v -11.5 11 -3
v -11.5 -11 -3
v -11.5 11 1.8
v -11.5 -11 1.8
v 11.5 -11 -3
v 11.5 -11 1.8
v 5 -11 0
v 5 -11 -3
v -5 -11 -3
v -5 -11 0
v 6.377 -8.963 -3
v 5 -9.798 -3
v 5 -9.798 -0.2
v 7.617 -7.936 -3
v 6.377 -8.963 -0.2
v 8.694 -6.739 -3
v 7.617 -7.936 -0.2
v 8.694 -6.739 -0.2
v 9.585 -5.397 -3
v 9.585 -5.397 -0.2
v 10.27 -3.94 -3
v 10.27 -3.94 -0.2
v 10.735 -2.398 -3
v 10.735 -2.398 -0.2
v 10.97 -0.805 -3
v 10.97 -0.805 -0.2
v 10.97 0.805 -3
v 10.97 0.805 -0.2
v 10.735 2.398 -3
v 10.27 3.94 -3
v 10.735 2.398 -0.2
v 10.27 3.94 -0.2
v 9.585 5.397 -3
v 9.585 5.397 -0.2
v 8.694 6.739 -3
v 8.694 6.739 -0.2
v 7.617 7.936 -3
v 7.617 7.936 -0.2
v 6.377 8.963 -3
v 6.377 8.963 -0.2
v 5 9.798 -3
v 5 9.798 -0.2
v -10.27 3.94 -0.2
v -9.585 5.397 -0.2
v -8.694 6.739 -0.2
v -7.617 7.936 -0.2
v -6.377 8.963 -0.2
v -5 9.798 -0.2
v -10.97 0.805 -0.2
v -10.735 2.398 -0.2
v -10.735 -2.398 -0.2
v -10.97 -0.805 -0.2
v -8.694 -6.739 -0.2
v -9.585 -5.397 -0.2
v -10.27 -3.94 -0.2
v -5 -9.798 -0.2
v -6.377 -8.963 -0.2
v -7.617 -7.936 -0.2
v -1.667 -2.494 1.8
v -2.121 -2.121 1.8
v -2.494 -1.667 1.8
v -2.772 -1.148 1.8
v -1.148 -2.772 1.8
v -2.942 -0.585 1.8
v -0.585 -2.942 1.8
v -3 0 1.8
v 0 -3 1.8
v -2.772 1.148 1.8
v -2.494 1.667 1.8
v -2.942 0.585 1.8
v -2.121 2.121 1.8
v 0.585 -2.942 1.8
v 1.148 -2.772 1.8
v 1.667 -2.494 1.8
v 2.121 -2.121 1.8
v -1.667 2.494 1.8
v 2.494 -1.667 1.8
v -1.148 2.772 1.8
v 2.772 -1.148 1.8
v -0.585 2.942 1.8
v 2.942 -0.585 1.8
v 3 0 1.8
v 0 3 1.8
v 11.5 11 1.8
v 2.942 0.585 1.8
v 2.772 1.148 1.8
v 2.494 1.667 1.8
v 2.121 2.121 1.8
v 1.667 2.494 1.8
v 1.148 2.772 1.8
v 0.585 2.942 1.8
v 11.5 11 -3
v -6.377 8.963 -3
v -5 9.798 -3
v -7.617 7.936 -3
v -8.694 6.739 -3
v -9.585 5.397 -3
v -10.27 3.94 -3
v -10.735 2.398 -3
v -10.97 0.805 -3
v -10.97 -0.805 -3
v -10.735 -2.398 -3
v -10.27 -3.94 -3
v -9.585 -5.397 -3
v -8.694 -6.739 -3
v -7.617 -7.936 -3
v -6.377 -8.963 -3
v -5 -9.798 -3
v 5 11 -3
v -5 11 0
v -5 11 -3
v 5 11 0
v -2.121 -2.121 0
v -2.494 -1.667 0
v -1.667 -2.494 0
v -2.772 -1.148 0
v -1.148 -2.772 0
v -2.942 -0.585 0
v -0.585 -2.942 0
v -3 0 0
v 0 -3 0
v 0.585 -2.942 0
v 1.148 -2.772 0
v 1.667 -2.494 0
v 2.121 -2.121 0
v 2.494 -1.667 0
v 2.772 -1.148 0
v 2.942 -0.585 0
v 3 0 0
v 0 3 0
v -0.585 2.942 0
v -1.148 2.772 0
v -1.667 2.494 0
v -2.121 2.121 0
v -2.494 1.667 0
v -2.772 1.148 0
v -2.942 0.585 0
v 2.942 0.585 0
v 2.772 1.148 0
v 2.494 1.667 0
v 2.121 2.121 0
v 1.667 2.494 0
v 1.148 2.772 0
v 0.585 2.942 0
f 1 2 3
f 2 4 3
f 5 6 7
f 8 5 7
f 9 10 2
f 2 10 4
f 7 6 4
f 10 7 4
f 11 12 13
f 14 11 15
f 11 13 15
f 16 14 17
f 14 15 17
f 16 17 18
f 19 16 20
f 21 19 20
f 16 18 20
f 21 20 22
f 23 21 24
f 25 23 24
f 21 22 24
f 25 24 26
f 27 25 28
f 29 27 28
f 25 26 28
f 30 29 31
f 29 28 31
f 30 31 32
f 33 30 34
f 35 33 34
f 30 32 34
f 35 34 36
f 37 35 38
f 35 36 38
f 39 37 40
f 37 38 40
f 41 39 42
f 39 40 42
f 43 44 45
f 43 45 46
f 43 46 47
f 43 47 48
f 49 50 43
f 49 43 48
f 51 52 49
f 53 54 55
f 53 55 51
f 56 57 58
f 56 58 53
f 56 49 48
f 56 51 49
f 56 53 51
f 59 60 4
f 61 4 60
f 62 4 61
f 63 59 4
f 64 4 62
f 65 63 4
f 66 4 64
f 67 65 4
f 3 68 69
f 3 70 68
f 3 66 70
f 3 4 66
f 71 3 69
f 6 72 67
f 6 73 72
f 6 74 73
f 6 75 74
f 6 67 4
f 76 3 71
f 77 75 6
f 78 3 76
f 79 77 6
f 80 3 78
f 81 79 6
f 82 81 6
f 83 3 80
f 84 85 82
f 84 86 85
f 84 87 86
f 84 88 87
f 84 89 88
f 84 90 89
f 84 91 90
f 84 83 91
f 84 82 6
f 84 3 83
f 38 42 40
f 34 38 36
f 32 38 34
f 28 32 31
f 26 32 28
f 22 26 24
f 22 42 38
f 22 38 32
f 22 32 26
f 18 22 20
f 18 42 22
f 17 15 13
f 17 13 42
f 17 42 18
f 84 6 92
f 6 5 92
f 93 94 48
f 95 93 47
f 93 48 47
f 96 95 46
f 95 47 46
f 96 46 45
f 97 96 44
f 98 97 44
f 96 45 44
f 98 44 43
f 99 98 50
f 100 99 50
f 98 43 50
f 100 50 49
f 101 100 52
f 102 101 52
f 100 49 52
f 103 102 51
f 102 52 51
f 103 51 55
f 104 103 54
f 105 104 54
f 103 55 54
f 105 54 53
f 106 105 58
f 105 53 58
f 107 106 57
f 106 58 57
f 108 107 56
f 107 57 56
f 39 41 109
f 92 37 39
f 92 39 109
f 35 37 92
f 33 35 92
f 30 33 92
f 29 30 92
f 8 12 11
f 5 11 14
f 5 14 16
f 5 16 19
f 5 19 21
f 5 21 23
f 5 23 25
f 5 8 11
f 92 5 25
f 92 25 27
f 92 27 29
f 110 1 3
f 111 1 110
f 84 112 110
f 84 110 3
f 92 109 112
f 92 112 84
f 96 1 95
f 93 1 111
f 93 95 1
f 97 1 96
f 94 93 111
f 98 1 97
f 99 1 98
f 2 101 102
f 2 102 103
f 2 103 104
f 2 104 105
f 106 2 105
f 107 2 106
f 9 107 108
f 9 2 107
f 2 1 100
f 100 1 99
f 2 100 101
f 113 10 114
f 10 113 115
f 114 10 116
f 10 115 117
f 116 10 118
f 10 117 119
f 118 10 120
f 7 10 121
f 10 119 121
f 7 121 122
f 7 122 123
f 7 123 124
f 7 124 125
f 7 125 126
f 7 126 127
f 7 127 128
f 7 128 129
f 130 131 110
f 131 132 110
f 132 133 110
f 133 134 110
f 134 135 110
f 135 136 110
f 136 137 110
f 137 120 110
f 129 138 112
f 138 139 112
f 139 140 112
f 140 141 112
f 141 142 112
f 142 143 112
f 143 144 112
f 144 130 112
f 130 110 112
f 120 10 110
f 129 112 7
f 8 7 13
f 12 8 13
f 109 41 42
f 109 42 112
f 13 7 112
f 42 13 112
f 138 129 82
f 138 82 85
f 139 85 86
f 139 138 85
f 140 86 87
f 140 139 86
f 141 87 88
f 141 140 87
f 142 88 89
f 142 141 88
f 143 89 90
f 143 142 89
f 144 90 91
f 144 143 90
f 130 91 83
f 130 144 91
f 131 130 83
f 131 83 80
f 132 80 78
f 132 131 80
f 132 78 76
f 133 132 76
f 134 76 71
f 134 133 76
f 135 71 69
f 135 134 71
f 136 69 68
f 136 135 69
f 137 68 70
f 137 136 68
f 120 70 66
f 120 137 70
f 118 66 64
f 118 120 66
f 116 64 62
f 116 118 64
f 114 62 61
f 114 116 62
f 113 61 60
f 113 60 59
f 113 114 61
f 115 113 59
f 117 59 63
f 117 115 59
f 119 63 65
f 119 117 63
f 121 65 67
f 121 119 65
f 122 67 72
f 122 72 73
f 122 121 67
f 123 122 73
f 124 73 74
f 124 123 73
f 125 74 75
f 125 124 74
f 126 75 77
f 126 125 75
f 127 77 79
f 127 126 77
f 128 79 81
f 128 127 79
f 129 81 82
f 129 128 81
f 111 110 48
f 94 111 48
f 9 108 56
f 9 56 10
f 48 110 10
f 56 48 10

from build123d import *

# Parameters (mm, degrees)
F0_W     = 23
F0_H     = 22
F0_R     = 3
F1_DEPTH = 1.8
F3_DEPTH = 0.2
F4_DEPTH = 3


with BuildPart() as f1:
    # F0 (on Top) → F1 (new body)
    with BuildSketch(Plane.XY):
        Rectangle(F0_W, F0_H)
        Circle(F0_R, mode=Mode.SUBTRACT)
    extrude(amount=F1_DEPTH)

    # F2 (on face) → F3 (join)
    with BuildSketch(Plane(origin=(0, 0, 0), x_dir=(1, 0, 0), z_dir=(0, 0, -1))):
        with BuildLine():
            Line((-5, -9.797959), (-5, 9.797959))
            ThreePointArc((-5, 9.797959), (-11, 0), (-5, -9.797959))
        make_face()
        with BuildLine():
            ThreePointArc((5, -9.797959), (11, 0), (5, 9.797959))
            Line((5, 9.797959), (5, -9.797959))
        make_face()
    extrude(amount=F3_DEPTH)

    # F2 (on face) → F4 (join)
    with BuildSketch(Plane(origin=(0, 0, 0), x_dir=(1, 0, 0), z_dir=(0, 0, -1))):
        with BuildLine():
            Line((-5, 9.797959), (-5, 11))
            Line((-5, 11), (-11.5, 11))
            Line((-11.5, 11), (-11.5, -11))
            Line((-11.5, -11), (-5, -11))
            Line((-5, -11), (-5, -9.797959))
            ThreePointArc((-5, -9.797959), (-11, 0), (-5, 9.797959))
        make_face()
        with BuildLine():
            Line((11.5, 11), (5, 11))
            Line((5, 11), (5, 9.797959))
            ThreePointArc((5, 9.797959), (11, 0), (5, -9.797959))
            Line((5, -9.797959), (5, -11))
            Line((5, -11), (11.5, -11))
            Line((11.5, -11), (11.5, 11))
        make_face()
    extrude(amount=F4_DEPTH)


solid = f1.part
